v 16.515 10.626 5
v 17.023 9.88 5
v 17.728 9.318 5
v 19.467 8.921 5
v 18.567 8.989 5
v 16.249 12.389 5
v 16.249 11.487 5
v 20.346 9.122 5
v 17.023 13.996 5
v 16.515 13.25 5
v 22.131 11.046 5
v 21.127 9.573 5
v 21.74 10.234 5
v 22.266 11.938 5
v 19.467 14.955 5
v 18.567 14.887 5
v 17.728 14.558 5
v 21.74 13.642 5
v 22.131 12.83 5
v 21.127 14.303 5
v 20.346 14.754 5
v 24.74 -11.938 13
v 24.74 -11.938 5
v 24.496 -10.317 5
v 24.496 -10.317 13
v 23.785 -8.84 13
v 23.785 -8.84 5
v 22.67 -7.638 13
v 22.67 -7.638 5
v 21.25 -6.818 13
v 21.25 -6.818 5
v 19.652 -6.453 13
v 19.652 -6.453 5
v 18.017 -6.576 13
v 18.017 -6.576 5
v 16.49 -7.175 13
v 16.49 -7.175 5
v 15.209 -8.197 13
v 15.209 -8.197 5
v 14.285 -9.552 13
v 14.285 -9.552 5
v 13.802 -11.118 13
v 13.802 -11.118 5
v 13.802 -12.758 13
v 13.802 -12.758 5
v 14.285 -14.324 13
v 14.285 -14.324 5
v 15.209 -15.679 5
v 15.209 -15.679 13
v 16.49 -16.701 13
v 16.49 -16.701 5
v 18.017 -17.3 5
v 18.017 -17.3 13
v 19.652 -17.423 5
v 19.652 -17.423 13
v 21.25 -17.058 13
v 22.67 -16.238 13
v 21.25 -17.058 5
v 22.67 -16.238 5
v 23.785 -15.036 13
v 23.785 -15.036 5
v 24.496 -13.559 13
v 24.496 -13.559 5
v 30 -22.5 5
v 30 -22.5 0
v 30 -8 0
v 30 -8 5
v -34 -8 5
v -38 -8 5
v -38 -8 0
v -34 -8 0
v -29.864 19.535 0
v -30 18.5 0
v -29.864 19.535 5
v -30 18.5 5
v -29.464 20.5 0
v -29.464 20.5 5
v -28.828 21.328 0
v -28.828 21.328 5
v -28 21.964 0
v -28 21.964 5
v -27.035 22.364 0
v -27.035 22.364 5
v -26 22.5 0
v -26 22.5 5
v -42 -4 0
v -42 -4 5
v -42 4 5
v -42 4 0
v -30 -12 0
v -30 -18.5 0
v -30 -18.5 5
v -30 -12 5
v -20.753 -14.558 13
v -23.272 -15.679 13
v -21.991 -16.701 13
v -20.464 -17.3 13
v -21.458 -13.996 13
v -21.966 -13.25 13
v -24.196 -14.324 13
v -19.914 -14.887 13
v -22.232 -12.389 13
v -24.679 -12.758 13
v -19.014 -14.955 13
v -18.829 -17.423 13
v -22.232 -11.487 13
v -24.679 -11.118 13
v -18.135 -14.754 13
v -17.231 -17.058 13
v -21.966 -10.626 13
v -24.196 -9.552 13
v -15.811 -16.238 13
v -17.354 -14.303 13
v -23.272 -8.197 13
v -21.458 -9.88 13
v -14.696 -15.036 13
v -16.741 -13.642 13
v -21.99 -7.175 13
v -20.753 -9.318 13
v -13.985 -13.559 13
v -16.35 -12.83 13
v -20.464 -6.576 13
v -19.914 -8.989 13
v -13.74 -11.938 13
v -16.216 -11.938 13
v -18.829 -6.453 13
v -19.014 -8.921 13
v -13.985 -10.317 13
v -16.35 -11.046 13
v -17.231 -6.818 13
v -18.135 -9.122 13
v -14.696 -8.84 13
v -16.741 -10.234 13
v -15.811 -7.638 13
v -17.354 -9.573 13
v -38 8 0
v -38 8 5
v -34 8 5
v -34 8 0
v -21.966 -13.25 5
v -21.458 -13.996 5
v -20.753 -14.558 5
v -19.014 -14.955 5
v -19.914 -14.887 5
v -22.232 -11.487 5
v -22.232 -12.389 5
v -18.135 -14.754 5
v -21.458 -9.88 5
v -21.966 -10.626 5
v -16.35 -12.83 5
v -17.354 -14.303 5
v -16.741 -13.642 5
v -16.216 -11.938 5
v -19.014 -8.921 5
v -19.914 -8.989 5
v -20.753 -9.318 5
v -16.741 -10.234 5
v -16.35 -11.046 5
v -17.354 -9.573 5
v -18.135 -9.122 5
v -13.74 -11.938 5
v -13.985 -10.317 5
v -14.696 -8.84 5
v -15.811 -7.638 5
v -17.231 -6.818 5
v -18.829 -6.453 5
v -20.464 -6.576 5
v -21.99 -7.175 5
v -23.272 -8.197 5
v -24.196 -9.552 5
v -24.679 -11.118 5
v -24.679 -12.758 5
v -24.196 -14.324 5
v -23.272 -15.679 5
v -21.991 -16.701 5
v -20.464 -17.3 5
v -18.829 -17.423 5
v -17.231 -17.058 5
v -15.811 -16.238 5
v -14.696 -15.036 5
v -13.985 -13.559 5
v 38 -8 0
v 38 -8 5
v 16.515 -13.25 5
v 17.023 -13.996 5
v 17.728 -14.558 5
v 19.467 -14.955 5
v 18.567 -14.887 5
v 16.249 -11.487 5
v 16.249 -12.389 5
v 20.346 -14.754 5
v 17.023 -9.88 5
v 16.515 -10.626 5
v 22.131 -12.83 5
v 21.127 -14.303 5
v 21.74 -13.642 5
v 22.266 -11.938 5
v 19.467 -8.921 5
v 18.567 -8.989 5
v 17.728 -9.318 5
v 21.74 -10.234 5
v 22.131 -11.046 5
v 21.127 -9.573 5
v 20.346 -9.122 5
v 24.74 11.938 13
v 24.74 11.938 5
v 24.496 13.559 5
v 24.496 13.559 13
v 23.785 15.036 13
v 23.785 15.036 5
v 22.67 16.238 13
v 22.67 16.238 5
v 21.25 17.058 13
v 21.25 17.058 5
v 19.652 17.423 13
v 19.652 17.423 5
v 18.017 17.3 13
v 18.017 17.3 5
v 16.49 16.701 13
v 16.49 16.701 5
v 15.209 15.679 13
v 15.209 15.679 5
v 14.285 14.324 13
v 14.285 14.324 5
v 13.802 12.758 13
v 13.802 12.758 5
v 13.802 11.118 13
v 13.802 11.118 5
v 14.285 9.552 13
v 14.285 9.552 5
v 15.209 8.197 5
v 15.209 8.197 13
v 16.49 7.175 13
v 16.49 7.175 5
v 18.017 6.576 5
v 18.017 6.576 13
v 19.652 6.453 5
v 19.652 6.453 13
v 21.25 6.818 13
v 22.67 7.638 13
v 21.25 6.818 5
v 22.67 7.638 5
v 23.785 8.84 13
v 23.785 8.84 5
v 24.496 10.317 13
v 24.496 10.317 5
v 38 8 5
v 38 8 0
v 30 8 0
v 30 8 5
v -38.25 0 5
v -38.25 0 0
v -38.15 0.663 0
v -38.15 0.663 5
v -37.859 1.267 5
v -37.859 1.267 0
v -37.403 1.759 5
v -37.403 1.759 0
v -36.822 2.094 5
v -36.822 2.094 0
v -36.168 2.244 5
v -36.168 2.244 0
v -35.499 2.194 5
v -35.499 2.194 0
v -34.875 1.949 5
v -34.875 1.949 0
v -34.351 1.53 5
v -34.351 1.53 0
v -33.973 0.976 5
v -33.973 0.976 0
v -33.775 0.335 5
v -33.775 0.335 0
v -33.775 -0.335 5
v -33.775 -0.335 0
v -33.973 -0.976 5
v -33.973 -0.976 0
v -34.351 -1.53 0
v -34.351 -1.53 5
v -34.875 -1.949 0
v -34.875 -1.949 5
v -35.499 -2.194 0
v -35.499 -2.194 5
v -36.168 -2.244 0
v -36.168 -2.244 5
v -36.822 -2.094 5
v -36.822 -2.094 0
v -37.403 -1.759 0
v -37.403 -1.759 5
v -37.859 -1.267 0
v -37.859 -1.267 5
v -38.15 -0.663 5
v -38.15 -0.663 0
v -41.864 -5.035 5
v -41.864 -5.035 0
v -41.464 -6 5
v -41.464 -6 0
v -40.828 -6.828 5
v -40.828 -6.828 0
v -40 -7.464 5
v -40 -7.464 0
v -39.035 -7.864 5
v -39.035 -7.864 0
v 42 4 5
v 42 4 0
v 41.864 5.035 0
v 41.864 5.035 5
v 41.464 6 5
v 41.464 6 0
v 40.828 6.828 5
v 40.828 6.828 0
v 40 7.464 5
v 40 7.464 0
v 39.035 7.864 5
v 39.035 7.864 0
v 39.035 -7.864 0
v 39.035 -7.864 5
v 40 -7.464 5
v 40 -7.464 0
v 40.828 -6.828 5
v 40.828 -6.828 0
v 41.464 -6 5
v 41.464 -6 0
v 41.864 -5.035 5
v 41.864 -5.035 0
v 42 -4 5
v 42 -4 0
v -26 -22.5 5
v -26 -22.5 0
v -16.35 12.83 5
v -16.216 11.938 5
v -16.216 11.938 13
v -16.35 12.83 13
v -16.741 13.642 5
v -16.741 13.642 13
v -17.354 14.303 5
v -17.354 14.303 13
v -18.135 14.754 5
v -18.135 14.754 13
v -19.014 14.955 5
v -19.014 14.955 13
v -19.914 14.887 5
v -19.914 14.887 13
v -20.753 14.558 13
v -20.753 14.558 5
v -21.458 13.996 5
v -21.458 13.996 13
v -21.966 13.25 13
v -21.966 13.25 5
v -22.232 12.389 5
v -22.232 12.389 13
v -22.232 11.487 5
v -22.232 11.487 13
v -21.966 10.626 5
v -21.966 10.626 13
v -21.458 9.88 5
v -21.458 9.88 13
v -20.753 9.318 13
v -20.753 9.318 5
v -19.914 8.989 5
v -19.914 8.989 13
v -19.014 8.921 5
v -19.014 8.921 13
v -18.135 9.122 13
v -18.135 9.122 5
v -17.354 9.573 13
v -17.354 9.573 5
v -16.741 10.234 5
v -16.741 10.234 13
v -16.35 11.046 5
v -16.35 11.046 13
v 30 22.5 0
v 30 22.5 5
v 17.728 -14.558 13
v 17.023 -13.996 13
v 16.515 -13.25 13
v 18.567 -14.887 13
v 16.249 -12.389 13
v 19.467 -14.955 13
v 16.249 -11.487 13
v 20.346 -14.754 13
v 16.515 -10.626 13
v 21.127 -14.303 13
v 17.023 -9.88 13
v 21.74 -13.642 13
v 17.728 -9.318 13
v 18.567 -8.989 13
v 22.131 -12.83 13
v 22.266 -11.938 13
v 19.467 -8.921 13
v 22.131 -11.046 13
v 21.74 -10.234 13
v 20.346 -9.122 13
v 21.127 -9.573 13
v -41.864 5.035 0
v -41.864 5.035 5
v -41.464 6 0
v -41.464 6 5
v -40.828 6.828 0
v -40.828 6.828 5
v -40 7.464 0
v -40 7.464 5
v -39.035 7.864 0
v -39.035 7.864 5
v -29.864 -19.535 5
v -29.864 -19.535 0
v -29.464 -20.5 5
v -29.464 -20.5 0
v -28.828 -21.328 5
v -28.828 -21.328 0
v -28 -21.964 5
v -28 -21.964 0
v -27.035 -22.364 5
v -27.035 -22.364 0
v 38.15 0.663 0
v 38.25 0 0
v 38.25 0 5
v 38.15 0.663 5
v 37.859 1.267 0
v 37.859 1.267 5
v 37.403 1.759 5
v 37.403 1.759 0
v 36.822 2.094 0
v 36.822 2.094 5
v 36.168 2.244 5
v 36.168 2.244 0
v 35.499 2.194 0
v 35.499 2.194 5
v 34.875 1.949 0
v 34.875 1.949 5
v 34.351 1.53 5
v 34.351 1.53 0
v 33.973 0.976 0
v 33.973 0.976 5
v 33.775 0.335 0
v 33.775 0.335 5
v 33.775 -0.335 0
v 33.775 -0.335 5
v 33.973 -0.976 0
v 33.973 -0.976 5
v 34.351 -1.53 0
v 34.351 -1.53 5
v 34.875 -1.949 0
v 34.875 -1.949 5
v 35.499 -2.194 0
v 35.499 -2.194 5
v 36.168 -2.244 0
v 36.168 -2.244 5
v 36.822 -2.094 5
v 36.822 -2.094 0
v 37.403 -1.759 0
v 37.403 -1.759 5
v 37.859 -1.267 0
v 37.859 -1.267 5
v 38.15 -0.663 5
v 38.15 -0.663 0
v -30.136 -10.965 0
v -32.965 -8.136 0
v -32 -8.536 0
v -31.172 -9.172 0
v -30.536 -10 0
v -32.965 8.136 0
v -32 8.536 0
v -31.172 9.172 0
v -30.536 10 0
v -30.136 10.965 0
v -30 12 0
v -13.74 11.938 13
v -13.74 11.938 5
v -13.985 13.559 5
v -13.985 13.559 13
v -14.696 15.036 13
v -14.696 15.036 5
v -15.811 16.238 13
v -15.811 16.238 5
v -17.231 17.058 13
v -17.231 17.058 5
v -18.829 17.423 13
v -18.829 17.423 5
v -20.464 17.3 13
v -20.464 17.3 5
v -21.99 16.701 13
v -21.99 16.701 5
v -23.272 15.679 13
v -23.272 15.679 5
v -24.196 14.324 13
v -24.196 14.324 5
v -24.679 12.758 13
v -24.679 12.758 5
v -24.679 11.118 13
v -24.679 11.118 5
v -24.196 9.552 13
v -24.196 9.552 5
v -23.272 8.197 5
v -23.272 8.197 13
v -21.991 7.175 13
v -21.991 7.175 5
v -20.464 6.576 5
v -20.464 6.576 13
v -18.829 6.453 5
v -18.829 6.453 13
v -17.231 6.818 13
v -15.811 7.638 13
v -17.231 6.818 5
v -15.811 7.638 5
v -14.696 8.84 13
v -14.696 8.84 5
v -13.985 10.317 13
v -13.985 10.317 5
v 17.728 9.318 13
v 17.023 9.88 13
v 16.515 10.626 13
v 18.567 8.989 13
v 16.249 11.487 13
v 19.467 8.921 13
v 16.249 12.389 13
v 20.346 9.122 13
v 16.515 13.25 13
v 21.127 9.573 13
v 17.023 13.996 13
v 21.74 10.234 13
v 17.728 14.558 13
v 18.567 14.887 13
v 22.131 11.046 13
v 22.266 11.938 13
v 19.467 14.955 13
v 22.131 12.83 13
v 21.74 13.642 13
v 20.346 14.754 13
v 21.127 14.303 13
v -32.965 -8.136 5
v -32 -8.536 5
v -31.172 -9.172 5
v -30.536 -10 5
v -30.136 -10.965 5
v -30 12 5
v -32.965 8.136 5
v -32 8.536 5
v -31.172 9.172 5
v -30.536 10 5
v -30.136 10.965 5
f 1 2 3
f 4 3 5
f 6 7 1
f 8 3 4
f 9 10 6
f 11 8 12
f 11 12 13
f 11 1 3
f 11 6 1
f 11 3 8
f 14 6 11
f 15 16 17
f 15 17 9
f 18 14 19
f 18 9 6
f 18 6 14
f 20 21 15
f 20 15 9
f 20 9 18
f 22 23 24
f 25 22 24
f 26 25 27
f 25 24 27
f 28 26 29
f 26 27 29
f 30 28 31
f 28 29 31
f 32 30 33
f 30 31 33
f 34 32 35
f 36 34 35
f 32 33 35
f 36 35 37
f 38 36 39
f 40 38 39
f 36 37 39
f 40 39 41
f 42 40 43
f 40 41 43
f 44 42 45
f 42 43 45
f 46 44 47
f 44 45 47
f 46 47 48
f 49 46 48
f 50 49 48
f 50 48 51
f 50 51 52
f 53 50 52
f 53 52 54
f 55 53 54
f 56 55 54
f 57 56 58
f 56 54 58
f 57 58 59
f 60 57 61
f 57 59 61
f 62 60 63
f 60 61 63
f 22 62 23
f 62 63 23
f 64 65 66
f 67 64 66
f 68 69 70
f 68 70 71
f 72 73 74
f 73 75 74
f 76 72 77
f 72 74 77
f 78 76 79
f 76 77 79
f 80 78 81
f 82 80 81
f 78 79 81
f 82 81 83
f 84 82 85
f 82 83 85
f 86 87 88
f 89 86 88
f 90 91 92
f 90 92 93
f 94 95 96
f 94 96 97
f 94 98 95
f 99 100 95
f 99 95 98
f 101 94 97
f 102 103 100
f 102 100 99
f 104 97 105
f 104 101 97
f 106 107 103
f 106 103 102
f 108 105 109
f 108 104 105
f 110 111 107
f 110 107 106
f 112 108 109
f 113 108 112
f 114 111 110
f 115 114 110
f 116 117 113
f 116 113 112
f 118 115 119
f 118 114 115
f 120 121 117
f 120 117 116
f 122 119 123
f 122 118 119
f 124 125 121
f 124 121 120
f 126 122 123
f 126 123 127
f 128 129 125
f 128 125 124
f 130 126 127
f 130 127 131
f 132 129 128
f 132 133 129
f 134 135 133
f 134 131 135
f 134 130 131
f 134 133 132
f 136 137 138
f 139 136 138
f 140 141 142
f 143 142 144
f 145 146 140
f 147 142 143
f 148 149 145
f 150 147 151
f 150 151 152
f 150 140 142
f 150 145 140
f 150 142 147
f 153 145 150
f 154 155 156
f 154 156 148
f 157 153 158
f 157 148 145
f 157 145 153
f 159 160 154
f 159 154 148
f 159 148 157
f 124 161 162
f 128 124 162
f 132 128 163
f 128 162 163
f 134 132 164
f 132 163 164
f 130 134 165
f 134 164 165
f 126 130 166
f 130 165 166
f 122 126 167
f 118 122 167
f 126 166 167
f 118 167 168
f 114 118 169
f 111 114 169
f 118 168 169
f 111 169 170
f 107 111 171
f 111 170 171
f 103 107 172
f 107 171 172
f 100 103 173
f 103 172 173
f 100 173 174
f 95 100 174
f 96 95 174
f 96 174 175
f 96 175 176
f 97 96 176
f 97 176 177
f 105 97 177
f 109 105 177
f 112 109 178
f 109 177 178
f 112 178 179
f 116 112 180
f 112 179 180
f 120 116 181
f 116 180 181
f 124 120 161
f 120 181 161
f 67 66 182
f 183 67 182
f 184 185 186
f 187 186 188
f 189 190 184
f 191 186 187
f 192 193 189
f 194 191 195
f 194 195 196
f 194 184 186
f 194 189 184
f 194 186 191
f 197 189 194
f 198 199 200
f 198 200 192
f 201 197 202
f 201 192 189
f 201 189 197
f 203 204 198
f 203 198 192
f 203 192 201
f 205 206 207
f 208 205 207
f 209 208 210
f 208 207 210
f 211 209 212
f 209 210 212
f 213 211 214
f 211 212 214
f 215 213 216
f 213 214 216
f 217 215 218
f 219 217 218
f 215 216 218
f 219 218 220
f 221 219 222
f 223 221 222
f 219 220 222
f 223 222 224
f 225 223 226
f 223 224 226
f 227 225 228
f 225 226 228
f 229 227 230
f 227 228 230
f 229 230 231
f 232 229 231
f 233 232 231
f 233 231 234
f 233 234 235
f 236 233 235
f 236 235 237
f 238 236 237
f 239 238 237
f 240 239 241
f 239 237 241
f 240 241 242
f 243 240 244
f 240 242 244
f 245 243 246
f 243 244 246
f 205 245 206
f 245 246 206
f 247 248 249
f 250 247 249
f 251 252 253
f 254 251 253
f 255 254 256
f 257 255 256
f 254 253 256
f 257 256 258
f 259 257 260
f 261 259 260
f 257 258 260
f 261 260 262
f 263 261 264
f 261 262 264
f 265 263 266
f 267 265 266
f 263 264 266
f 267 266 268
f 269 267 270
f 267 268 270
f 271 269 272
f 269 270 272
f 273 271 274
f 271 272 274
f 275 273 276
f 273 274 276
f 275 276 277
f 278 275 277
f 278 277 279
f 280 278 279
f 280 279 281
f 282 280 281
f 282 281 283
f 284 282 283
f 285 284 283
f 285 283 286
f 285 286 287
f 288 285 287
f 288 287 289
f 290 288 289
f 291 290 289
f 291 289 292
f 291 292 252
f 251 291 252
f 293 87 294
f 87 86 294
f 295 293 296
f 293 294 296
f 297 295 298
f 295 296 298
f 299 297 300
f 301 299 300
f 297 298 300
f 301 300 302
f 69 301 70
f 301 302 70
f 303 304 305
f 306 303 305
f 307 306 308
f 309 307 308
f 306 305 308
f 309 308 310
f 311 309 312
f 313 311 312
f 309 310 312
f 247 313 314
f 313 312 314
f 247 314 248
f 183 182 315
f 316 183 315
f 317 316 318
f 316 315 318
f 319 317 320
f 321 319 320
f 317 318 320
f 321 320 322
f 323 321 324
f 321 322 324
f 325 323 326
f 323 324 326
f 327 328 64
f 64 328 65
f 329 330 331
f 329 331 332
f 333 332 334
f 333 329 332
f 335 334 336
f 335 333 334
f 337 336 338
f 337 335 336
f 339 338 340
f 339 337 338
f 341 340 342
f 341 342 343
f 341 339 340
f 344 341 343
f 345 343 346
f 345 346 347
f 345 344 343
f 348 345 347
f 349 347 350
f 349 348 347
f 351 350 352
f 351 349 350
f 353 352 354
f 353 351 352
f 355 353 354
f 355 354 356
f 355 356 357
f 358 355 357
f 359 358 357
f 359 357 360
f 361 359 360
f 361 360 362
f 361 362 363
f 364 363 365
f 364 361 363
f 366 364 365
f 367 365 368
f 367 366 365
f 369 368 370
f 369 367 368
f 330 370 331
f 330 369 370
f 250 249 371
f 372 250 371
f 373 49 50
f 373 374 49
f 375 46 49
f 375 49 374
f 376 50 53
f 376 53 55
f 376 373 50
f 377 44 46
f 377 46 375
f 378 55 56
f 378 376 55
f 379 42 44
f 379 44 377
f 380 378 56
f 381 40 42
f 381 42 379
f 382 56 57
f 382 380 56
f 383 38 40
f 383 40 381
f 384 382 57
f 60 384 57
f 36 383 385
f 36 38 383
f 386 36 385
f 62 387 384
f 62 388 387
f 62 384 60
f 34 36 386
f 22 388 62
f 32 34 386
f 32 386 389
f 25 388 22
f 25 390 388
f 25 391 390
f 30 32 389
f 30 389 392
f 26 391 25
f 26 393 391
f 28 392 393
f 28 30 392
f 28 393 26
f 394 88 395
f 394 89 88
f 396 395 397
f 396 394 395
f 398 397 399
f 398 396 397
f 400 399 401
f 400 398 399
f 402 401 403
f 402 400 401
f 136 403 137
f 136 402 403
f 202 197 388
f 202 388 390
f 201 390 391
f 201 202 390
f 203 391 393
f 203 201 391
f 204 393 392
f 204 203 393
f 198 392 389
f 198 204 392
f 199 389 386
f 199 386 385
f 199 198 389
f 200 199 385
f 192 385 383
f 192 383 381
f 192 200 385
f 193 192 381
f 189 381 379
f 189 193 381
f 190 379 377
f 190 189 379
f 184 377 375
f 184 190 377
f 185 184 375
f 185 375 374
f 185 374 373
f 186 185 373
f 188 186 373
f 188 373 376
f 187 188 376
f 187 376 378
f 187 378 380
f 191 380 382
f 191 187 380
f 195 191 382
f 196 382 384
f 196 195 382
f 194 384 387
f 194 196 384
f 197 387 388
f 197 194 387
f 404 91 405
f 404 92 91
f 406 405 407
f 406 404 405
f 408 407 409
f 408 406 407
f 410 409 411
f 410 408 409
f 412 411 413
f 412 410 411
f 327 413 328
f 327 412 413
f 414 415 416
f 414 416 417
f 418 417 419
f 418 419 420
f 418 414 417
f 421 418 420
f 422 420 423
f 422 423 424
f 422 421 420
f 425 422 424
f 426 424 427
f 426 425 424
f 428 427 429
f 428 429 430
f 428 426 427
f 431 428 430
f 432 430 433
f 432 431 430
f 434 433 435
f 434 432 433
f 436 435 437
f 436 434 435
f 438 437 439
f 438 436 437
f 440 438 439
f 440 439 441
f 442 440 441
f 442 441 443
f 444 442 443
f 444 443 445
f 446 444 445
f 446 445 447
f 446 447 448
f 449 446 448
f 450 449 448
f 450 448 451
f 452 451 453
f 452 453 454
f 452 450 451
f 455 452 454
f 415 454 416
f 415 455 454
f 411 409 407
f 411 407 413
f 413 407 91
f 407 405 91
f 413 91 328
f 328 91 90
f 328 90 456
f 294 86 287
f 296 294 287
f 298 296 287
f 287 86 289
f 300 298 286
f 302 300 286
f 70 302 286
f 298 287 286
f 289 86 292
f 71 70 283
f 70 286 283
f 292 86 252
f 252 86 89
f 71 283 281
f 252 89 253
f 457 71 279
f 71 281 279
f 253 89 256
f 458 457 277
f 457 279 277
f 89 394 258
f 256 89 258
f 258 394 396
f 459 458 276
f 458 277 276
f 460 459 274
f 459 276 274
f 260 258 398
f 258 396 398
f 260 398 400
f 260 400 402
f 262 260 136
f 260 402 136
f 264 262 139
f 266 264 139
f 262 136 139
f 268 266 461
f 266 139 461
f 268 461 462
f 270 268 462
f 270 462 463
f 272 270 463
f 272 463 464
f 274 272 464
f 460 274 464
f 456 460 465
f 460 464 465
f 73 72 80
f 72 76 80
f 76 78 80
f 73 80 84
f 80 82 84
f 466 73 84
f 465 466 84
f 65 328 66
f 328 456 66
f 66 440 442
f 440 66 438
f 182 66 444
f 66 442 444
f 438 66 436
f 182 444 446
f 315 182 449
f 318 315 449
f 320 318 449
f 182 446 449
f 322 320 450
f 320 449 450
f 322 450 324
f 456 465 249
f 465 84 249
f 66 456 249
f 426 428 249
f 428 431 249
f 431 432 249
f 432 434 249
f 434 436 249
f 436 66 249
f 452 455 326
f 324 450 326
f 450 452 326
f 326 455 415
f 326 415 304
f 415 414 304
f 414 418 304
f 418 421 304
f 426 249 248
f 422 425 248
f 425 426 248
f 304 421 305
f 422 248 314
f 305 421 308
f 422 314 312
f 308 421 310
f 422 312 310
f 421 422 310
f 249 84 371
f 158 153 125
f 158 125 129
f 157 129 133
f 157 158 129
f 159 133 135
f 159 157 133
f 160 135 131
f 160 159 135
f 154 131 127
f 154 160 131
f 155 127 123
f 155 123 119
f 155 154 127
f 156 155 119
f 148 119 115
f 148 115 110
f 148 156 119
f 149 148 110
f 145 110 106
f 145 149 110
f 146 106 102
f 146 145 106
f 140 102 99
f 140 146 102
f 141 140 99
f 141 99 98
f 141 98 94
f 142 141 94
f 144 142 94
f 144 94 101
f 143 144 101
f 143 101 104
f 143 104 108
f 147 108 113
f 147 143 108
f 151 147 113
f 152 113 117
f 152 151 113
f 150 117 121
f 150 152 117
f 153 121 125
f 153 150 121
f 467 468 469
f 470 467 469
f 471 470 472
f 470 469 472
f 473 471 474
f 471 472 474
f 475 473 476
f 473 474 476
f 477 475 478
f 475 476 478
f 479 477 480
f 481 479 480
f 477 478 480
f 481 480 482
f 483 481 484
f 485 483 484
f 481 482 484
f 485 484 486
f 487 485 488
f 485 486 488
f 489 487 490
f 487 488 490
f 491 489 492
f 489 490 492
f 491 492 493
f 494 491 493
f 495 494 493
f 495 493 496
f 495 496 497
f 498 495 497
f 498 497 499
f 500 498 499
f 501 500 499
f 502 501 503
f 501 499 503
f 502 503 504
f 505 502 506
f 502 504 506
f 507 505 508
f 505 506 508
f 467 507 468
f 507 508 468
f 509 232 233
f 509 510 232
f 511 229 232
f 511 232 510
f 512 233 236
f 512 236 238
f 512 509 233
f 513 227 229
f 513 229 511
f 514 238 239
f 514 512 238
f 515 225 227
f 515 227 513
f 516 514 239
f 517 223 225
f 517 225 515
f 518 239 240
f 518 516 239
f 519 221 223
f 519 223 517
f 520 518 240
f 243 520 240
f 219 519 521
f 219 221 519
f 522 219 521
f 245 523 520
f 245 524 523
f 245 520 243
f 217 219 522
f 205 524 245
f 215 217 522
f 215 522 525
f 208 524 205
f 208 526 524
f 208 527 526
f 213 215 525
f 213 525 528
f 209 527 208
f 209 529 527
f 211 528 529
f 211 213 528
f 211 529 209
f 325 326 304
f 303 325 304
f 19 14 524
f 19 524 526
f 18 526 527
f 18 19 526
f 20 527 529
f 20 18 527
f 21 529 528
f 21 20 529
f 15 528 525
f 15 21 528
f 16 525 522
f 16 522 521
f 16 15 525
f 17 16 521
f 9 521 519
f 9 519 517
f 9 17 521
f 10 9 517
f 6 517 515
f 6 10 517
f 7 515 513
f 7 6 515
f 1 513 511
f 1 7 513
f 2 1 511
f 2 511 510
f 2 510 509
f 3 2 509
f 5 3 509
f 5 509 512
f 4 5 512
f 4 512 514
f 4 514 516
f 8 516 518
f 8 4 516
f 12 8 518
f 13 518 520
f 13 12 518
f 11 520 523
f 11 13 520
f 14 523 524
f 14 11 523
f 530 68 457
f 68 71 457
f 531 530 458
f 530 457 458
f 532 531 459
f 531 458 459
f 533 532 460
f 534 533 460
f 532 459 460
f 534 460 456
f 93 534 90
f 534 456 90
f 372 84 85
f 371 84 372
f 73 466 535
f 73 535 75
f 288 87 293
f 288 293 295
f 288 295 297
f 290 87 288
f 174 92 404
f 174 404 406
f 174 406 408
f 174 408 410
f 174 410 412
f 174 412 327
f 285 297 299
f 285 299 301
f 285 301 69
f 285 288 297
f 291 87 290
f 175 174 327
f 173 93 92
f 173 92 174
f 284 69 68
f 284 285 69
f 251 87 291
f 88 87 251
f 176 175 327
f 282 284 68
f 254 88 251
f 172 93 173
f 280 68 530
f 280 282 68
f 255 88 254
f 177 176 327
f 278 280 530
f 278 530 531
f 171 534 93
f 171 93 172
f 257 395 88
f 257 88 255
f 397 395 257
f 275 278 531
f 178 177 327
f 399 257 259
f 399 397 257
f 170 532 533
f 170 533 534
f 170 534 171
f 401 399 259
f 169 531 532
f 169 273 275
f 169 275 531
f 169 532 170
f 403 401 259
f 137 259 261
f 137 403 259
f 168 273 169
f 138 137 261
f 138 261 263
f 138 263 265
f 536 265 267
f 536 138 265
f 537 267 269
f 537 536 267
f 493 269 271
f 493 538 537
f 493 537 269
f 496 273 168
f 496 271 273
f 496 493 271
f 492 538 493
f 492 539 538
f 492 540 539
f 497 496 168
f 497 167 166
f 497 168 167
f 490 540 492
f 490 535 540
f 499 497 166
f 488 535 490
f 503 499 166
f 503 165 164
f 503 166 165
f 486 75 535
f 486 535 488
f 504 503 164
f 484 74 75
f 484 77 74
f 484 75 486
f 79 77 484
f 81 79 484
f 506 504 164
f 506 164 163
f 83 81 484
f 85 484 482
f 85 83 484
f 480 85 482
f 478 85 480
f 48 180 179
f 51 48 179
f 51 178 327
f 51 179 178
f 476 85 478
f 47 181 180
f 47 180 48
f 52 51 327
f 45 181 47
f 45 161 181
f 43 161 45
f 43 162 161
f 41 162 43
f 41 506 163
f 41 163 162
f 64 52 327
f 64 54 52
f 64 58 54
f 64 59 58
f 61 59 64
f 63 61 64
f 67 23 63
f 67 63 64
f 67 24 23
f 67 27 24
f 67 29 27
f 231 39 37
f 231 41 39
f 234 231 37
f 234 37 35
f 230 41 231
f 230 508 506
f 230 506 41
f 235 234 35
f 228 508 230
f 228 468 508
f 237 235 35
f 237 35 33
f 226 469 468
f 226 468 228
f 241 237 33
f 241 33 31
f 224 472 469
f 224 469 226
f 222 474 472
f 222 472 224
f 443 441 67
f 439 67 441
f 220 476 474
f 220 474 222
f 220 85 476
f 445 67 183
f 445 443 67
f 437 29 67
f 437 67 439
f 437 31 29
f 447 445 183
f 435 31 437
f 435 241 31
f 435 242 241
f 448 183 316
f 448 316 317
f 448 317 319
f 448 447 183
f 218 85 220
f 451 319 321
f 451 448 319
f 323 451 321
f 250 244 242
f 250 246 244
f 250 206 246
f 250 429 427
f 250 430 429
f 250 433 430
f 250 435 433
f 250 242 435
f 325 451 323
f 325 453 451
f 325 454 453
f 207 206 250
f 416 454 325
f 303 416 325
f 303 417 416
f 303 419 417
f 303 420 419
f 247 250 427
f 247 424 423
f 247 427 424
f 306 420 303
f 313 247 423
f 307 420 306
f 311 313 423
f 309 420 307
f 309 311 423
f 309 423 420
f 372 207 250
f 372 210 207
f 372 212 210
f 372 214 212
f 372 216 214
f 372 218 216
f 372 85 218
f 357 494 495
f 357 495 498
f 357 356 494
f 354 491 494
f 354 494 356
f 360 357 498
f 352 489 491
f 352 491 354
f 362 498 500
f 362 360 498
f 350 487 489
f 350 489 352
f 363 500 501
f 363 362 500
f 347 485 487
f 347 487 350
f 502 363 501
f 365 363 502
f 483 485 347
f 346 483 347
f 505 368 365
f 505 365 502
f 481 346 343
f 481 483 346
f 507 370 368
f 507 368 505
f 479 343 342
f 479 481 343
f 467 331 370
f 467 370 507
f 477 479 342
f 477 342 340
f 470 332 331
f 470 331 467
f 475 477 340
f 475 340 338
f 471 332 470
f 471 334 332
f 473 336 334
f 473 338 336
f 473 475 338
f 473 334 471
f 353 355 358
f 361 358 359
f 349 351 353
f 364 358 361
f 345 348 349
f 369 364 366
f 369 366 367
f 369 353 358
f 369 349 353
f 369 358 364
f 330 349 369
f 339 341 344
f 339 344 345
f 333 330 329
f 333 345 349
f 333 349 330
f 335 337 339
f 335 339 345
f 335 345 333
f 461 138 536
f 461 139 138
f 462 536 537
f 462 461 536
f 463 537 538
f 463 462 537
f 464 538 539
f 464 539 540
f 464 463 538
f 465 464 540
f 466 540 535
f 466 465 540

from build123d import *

# Parameters (mm, degrees)
SKETCH1_W            = 60
SKETCH1_H            = 45
BOSS_EXTRUDE1_DEPTH  = 5
SKETCH3_R            = 5.5
SKETCH3_R_2          = 3.025
BOSS_EXTRUDE2_DEPTH  = 8
SKETCH4_W            = 12
SKETCH4_H            = 16
SKETCH4_R            = 2.55
BOSS_EXTRUDE3_DEPTH  = 5
FILLET1_R            = 4
M4_CLEARANCE_HOLE1_D = 4.5
MIRROR1_OUTLINE_R    = 2.25
MIRROR1_DEPTH        = 5


# Read off the part's stored shape, not the designer's step: Mirror1
with BuildPart() as part:
    # Sketch1 → Boss-Extrude1 (new body)
    with BuildSketch(Plane.XY):
        Rectangle(SKETCH1_W, SKETCH1_H)
    extrude(amount=BOSS_EXTRUDE1_DEPTH)

    # Sketch3 → Boss-Extrude2 (add)
    # profile 1 of 4: a face of its own
    with BuildSketch(Plane.XY.offset(5)):
        with Locations((-19.2405, 11.938)):
            Circle(SKETCH3_R)
        with Locations((-19.2405, 11.938)):
            Circle(SKETCH3_R_2, mode=Mode.SUBTRACT)
    # profile 2 of 4: a face of its own
    with BuildSketch(Plane.XY.offset(5)):
        with Locations((-19.2405, -11.938)):
            Circle(SKETCH3_R)
        with Locations((-19.2405, -11.938)):
            Circle(SKETCH3_R_2, mode=Mode.SUBTRACT)
    # profile 3 of 4: a face of its own
    with BuildSketch(Plane.XY.offset(5)):
        with Locations((19.2405, 11.938)):
            Circle(SKETCH3_R)
        with Locations((19.2405, 11.938)):
            Circle(SKETCH3_R_2, mode=Mode.SUBTRACT)
    # profile 4 of 4: a face of its own
    with BuildSketch(Plane.XY.offset(5)):
        with Locations((19.2405, -11.938)):
            Circle(SKETCH3_R)
        with Locations((19.2405, -11.938)):
            Circle(SKETCH3_R_2, mode=Mode.SUBTRACT)
    extrude(amount=BOSS_EXTRUDE2_DEPTH)

    # Sketch4 → Boss-Extrude3 (add)
    # profile 1 of 2: a face of its own
    with BuildSketch(Plane.XY.offset(5)):
        with Locations((-36, 0)):
            Rectangle(SKETCH4_W, SKETCH4_H)
        with Locations((-36, 0)):
            Circle(SKETCH4_R, mode=Mode.SUBTRACT)
    # profile 2 of 2: a face of its own
    with BuildSketch(Plane.XY.offset(5)):
        with Locations((-36, 0)):
            Circle(SKETCH4_R)
    extrude(amount=-BOSS_EXTRUDE3_DEPTH)

    # Fillet1
    fillet1_edges = [part.edges().sort_by_distance(p)[0] for p in [
        (-42, -8, 2.5),
        (-42, 8, 2.5),
        (-30, 8, 2.5),
        (-30, -8, 2.5),
        (-30, 22.5, 2.5),
        (-30, -22.5, 2.5),
    ]]
    fillet(fillet1_edges, radius=FILLET1_R)

    # M4 Clearance Hole1 (through all)
    with Locations(Plane.XY.offset(5)):
        with Locations((-36, 0)):
            Hole(M4_CLEARANCE_HOLE1_D / 2)

    # Mirror1 outline → Mirror1 (add)
    with BuildSketch(Plane.XY):
        with BuildLine():
            ThreePointArc((42, 4), (40.828427125, 6.828427125), (38, 8))
            Line((38, 8), (30, 8))
            Line((30, 8), (30, -8))
            Line((30, -8), (38, -8))
            ThreePointArc((38, -8), (40.828427125, -6.828427125), (42, -4))
            Line((42, -4), (42, 4))
        make_face()
        with Locations((36, 0)):
            Circle(MIRROR1_OUTLINE_R, mode=Mode.SUBTRACT)
    extrude(amount=MIRROR1_DEPTH)


solid = part.part
